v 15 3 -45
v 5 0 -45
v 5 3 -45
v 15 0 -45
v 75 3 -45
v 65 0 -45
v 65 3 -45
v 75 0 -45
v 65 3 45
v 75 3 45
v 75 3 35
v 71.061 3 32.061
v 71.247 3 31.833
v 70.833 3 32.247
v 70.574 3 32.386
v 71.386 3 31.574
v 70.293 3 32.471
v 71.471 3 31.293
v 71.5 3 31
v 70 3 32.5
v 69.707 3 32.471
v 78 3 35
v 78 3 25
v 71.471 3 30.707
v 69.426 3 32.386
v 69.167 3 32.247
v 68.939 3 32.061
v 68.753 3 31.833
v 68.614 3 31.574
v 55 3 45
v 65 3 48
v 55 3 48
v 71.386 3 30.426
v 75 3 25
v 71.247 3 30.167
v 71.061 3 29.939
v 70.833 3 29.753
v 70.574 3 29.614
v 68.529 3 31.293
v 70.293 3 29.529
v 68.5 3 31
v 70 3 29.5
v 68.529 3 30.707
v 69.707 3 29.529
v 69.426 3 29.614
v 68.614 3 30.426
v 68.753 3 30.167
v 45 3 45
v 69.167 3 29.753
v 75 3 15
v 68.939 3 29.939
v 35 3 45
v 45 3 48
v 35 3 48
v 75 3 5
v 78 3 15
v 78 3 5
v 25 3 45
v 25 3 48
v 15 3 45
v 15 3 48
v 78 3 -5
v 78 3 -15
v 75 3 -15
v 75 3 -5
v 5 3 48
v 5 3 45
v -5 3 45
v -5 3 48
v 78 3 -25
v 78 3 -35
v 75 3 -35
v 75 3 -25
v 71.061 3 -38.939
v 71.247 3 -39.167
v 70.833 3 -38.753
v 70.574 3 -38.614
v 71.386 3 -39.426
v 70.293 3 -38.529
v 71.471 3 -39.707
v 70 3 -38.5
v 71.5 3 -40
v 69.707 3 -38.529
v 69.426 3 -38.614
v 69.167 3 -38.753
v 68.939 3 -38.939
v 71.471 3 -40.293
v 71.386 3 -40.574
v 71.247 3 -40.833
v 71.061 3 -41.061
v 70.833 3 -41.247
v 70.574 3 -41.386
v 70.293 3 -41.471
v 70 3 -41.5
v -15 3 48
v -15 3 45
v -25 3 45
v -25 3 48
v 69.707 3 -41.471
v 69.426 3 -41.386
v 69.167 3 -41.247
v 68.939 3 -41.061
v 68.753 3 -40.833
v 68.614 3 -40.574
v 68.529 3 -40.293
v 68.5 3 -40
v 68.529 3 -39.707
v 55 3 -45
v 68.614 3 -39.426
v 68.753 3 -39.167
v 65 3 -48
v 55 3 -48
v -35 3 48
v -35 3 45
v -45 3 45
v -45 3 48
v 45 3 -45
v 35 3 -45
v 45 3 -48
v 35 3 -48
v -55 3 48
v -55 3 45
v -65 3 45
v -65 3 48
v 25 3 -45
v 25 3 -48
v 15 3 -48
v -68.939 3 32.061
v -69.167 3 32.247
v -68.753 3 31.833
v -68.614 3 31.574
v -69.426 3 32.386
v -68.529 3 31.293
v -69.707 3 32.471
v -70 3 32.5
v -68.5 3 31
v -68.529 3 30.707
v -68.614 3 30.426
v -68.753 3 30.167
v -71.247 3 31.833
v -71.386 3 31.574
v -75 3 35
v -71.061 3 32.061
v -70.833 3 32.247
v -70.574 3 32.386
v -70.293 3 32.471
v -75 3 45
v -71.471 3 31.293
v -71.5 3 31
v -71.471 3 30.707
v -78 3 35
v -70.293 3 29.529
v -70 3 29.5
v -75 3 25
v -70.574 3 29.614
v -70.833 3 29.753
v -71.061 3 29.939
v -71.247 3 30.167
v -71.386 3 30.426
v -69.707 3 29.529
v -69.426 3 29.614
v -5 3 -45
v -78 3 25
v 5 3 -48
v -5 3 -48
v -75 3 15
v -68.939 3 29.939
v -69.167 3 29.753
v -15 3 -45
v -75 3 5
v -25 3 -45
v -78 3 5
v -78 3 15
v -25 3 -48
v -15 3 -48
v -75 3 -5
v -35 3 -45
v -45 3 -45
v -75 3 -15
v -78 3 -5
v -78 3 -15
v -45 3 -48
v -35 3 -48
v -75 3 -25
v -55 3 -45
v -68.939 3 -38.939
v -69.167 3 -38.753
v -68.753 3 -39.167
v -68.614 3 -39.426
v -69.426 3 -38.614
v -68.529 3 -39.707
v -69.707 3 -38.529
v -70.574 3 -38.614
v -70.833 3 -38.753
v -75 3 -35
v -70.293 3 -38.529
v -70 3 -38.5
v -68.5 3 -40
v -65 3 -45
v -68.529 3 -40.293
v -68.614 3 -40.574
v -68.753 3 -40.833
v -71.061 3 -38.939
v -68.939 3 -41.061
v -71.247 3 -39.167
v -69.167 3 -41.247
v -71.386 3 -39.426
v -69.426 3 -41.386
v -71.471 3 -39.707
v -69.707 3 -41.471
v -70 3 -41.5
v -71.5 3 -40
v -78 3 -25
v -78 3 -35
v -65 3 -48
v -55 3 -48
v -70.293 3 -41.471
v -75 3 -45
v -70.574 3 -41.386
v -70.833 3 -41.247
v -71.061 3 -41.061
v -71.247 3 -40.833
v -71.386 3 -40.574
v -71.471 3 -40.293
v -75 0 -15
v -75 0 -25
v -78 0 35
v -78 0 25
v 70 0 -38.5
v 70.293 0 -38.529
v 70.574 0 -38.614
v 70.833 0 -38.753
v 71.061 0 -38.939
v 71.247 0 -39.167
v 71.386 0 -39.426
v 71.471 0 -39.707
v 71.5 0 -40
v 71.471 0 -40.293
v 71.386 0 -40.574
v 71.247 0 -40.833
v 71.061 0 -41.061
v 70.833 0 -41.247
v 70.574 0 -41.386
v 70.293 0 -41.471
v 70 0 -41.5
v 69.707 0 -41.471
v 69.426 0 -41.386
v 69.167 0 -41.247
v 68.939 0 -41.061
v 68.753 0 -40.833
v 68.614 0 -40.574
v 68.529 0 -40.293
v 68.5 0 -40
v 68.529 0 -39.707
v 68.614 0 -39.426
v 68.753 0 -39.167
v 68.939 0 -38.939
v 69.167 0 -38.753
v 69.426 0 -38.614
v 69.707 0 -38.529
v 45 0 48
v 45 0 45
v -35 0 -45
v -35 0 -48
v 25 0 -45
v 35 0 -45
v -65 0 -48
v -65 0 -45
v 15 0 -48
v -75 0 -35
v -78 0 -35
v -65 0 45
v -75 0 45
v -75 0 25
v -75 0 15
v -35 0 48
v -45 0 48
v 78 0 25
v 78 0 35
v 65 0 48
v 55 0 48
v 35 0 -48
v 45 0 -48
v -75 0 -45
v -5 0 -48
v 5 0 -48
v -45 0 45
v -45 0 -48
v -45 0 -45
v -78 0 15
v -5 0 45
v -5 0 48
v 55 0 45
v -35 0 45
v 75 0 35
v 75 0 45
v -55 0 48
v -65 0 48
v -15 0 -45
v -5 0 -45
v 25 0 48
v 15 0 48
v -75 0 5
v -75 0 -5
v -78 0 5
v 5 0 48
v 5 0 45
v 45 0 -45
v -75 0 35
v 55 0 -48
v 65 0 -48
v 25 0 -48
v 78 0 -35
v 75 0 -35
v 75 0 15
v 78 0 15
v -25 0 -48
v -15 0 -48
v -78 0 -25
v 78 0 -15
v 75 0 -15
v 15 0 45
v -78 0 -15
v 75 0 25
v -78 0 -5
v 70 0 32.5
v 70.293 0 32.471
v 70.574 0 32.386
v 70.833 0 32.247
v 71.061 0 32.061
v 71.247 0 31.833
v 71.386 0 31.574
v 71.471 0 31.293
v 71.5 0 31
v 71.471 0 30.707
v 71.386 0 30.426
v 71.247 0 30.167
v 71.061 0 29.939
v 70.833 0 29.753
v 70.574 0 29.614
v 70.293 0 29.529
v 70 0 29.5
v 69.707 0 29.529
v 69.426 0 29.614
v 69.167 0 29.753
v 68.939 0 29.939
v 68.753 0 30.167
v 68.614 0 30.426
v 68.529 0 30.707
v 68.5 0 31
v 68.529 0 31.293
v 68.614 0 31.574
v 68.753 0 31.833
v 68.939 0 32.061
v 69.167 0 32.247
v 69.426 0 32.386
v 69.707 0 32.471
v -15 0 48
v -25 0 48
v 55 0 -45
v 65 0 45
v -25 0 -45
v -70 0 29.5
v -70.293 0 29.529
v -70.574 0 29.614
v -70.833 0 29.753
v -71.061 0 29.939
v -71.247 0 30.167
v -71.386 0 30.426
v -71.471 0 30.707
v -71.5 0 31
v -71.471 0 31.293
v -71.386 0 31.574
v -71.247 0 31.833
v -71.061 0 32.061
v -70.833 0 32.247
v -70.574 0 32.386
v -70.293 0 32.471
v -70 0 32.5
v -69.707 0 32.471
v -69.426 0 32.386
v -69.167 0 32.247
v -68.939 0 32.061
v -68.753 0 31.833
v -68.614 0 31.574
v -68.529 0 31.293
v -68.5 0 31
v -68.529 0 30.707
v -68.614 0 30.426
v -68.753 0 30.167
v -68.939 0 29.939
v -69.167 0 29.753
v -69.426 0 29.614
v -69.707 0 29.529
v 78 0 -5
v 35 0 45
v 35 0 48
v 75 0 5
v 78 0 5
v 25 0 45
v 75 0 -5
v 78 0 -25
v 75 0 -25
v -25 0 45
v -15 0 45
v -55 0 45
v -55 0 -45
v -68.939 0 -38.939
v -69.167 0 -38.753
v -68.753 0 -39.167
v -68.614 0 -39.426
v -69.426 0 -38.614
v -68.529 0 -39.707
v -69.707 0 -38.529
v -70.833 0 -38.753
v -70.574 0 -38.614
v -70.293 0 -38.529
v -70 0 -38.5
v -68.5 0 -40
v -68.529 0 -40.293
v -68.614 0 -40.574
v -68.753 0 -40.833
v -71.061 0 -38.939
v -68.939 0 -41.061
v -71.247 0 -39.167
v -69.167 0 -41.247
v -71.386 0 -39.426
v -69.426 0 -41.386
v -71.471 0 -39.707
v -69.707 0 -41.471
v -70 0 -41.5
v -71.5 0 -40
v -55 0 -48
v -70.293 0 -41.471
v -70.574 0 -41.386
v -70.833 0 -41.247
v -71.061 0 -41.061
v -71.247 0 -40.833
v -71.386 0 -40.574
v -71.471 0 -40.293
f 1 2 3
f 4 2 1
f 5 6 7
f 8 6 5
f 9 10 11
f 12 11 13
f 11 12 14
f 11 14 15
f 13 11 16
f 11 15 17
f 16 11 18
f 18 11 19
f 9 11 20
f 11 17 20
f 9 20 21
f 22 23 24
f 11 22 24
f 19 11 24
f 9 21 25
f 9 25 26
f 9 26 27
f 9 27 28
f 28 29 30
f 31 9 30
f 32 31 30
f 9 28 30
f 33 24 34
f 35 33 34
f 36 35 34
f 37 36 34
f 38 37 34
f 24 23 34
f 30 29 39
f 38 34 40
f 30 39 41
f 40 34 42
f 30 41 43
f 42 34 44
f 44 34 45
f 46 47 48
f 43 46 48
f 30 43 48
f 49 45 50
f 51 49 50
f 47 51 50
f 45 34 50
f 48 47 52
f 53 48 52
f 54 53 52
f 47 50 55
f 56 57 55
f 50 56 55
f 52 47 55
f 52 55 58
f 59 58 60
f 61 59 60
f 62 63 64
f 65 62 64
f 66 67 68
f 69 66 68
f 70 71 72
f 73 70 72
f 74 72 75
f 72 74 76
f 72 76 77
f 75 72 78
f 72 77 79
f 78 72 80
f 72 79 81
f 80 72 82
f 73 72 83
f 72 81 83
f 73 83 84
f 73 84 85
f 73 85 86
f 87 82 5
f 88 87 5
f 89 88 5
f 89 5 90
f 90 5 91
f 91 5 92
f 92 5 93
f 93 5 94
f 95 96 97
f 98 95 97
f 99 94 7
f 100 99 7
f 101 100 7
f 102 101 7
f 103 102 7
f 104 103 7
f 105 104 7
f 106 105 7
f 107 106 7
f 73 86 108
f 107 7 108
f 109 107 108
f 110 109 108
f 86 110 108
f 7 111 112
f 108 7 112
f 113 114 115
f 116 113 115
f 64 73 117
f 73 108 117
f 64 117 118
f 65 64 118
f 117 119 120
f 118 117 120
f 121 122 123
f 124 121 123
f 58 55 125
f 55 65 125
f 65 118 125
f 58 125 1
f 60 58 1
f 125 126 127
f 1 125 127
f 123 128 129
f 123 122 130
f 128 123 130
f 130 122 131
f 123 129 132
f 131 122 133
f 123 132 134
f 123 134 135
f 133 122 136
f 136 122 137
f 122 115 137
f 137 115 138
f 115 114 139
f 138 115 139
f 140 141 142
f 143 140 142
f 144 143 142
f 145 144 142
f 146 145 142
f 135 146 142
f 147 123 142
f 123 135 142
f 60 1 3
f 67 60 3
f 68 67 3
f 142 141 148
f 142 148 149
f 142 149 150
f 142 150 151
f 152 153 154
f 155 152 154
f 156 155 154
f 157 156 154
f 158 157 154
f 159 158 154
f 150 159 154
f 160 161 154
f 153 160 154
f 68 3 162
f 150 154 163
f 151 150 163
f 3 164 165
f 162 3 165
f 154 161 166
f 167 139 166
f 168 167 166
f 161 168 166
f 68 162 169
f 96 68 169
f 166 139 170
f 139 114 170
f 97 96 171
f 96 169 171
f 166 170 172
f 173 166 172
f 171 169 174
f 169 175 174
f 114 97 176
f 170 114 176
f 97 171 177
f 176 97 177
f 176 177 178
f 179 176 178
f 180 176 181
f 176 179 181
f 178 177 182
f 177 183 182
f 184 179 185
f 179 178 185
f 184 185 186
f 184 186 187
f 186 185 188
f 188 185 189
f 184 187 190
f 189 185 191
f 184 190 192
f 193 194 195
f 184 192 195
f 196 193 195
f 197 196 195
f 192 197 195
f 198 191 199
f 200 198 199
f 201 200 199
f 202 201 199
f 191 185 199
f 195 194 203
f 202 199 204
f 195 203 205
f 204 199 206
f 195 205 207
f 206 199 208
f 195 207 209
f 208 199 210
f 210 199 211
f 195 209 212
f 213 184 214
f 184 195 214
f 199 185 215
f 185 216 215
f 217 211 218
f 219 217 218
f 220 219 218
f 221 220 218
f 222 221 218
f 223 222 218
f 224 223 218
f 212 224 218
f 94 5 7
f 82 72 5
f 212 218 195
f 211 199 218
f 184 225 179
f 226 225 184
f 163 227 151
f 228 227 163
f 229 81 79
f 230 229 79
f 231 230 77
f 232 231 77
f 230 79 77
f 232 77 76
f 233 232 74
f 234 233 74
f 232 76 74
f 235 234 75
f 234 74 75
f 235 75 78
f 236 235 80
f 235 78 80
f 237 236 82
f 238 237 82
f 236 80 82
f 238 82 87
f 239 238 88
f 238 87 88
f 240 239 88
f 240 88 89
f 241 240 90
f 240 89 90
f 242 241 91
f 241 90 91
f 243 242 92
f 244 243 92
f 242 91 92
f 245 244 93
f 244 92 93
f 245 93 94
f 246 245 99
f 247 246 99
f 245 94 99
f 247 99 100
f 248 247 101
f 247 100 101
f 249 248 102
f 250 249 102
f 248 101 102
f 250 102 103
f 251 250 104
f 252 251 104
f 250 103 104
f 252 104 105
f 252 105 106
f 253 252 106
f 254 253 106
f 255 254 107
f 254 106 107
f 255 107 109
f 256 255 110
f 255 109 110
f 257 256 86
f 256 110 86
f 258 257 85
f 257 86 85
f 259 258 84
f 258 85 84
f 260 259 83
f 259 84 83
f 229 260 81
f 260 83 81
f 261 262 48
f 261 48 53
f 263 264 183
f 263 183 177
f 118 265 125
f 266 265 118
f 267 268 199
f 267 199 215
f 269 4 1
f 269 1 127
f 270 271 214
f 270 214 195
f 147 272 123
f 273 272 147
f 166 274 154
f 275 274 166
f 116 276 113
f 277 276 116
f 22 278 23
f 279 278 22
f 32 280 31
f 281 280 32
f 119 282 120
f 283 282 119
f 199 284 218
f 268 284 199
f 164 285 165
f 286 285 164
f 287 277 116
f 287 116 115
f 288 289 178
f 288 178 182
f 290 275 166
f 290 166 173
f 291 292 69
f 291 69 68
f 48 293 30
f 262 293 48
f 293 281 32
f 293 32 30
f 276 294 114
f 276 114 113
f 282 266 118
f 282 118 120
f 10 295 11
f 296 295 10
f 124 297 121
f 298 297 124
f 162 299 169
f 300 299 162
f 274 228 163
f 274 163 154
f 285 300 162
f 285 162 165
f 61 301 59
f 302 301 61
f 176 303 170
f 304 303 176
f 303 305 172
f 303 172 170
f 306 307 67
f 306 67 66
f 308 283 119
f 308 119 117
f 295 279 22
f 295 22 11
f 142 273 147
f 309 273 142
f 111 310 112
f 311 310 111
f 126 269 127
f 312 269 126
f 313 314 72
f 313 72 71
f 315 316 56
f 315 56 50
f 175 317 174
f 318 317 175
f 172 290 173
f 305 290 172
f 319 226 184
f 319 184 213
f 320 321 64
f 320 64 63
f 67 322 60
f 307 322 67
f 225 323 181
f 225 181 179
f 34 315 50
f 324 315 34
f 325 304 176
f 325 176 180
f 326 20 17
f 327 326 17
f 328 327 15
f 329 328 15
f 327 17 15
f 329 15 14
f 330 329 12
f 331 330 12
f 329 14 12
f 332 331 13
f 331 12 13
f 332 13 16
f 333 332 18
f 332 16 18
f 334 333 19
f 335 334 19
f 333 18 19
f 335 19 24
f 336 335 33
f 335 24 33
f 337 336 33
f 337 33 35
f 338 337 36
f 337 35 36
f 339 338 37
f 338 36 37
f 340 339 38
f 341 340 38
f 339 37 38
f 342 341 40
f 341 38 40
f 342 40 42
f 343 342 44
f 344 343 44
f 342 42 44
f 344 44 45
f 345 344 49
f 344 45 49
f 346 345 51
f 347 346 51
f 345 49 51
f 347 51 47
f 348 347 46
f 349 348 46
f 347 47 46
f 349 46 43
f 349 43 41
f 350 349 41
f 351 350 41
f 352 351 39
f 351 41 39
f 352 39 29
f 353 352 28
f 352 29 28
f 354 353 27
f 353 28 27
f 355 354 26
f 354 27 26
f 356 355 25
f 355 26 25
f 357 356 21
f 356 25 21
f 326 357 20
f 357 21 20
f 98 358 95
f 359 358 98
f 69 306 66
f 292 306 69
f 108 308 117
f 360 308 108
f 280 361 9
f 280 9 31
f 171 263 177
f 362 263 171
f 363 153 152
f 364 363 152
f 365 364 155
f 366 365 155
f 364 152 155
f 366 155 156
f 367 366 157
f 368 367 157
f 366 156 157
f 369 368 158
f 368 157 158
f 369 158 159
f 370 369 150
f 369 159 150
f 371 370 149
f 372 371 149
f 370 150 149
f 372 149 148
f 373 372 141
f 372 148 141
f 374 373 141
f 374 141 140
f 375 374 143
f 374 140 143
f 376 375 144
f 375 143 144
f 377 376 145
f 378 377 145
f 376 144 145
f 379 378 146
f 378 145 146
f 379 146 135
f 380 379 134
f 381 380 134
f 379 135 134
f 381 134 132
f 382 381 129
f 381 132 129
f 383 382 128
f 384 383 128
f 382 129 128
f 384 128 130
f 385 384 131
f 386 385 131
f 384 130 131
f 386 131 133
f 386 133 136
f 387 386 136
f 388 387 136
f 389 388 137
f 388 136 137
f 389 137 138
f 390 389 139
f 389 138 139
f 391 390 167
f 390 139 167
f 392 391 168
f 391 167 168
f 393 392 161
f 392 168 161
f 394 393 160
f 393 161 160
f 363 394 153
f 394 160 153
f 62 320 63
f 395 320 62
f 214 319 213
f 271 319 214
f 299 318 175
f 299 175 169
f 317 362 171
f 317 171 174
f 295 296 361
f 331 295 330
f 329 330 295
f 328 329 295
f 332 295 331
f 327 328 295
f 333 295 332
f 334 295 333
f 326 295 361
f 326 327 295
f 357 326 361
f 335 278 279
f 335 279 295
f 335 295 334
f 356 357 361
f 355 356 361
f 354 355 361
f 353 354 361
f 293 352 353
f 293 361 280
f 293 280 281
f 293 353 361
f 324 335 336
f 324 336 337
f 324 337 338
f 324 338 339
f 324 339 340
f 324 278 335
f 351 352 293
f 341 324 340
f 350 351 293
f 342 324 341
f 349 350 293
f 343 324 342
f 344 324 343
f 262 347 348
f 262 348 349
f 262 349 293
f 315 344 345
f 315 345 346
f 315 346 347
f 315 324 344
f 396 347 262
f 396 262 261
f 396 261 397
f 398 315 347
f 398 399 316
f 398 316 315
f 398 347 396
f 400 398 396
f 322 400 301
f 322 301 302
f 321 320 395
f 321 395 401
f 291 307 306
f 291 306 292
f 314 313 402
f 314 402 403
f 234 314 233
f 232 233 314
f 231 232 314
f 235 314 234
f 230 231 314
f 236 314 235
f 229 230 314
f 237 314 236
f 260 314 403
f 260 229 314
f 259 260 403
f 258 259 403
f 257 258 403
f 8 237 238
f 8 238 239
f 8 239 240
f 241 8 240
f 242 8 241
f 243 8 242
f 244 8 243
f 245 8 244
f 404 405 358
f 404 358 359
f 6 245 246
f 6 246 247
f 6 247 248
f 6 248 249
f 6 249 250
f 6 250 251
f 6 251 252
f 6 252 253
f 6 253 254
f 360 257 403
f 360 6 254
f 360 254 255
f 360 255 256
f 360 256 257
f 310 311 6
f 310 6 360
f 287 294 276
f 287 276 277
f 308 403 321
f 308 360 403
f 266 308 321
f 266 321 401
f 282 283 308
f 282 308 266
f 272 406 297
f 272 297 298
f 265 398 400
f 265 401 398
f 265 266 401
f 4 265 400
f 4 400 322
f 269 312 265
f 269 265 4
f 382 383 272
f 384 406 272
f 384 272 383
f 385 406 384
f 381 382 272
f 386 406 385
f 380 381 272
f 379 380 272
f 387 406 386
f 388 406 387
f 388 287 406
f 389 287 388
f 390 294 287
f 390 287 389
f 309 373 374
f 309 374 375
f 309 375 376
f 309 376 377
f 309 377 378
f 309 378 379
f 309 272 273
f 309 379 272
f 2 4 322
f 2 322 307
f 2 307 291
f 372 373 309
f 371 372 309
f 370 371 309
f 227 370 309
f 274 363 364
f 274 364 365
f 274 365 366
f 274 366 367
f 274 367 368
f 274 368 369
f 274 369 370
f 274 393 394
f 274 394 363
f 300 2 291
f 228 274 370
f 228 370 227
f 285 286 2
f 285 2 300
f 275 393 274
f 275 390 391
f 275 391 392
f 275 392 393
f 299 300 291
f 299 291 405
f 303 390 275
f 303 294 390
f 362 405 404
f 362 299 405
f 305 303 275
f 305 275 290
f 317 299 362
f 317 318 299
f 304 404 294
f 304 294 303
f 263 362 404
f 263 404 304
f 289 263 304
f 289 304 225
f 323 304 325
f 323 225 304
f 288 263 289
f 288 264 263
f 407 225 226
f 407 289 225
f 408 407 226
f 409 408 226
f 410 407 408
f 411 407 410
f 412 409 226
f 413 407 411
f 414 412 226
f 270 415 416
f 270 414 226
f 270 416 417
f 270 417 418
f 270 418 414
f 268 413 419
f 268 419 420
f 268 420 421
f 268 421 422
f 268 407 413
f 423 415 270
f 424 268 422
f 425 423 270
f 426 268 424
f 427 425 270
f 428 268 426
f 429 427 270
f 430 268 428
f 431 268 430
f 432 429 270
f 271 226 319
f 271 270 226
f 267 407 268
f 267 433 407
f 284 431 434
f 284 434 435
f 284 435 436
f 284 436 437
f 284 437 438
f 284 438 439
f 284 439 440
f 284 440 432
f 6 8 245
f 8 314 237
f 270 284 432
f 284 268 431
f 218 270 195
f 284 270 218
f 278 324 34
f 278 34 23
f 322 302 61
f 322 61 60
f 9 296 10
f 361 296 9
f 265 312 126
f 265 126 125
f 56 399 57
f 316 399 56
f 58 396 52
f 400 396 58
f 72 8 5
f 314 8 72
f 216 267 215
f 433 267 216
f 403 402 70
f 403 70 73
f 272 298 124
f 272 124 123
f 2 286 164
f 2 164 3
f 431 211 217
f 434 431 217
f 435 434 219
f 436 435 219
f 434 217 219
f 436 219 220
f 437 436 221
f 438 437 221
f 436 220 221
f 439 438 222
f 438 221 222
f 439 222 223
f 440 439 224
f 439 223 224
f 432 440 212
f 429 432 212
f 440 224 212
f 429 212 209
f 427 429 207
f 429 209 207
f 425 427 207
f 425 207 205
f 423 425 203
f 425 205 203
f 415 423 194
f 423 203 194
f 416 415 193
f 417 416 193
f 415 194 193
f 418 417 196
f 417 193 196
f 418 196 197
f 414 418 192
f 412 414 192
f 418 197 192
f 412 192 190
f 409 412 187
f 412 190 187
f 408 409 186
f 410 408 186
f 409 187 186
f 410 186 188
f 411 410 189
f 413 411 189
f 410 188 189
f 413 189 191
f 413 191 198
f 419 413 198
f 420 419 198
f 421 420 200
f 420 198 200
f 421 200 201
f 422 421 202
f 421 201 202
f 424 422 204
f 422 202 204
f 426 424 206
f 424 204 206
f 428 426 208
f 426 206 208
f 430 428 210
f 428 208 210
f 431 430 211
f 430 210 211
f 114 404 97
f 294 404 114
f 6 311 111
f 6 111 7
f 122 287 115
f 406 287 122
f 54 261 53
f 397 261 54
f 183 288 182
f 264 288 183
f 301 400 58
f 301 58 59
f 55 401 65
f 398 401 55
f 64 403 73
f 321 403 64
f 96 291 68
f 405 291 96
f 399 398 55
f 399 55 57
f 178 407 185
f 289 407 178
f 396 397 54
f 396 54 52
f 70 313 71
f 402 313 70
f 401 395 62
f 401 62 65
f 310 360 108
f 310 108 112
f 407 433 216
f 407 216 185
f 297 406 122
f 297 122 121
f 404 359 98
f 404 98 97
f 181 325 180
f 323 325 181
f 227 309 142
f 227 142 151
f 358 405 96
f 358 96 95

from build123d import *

# Parameters (mm, degrees)
BOSS_EXTRUDE1_DEPTH = 3
SKETCH2_R           = 1.5
CUT_EXTRUDE1_DEPTH  = 3


with BuildPart() as part:
    # Sketch1 → Boss-Extrude1 (new body)
    with BuildSketch(Plane(origin=(0, 0, 0), x_dir=(1, 0, 0), z_dir=(0, 1, 0))):
        Polygon((-5, 48), (5, 48), (5, 45), (15, 45), (15, 48), (25, 48), (25, 45), (35, 45), (35, 48), (45, 48), (45, 45), (55, 45), (55, 48), (65, 48), (65, 45), (75, 45), (75, 35), (78, 35), (78, 25), (75, 25), (75, 15), (78, 15), (78, 5), (75, 5), (75, -5), (78, -5), (78, -15), (75, -15), (75, -25), (78, -25), (78, -35), (75, -35), (75, -45), (65, -45), (65, -48), (55, -48), (55, -45), (45, -45), (45, -48), (35, -48), (35, -45), (25, -45), (25, -48), (15, -48), (15, -45), (5, -45), (5, -48), (-5, -48), (-5, -45), (-15, -45), (-15, -48), (-25, -48), (-25, -45), (-35, -45), (-35, -48), (-45, -48), (-45, -45), (-55, -45), (-55, -48), (-65, -48), (-65, -45), (-75, -45), (-75, -35), (-78, -35), (-78, -25), (-75, -25), (-75, -15), (-78, -15), (-78, -5), (-75, -5), (-75, 5), (-78, 5), (-78, 15), (-75, 15), (-75, 25), (-78, 25), (-78, 35), (-75, 35), (-75, 45), (-65, 45), (-65, 48), (-55, 48), (-55, 45), (-45, 45), (-45, 48), (-35, 48), (-35, 45), (-25, 45), (-25, 48), (-15, 48), (-15, 45), (-5, 45), align=None)
    extrude(amount=BOSS_EXTRUDE1_DEPTH)

    # Sketch2 → Cut-Extrude1 (cut)
    with BuildSketch(Plane(origin=(0, 3, 0), x_dir=(1, 0, 0), z_dir=(0, 1, 0))):
        with Locations(Location((70, 40, 0), (0, 0, 270))):
            Circle(SKETCH2_R)
        with Locations(Location((70, -31, 0), (0, 0, 270))):
            Circle(SKETCH2_R)
        with Locations(Location((-70, 40, 0), (0, 0, 90))):
            Circle(SKETCH2_R)
        with Locations(Location((-70, -31, 0), (0, 0, 90))):
            Circle(SKETCH2_R)
    extrude(amount=-CUT_EXTRUDE1_DEPTH, mode=Mode.SUBTRACT)


solid = part.part
